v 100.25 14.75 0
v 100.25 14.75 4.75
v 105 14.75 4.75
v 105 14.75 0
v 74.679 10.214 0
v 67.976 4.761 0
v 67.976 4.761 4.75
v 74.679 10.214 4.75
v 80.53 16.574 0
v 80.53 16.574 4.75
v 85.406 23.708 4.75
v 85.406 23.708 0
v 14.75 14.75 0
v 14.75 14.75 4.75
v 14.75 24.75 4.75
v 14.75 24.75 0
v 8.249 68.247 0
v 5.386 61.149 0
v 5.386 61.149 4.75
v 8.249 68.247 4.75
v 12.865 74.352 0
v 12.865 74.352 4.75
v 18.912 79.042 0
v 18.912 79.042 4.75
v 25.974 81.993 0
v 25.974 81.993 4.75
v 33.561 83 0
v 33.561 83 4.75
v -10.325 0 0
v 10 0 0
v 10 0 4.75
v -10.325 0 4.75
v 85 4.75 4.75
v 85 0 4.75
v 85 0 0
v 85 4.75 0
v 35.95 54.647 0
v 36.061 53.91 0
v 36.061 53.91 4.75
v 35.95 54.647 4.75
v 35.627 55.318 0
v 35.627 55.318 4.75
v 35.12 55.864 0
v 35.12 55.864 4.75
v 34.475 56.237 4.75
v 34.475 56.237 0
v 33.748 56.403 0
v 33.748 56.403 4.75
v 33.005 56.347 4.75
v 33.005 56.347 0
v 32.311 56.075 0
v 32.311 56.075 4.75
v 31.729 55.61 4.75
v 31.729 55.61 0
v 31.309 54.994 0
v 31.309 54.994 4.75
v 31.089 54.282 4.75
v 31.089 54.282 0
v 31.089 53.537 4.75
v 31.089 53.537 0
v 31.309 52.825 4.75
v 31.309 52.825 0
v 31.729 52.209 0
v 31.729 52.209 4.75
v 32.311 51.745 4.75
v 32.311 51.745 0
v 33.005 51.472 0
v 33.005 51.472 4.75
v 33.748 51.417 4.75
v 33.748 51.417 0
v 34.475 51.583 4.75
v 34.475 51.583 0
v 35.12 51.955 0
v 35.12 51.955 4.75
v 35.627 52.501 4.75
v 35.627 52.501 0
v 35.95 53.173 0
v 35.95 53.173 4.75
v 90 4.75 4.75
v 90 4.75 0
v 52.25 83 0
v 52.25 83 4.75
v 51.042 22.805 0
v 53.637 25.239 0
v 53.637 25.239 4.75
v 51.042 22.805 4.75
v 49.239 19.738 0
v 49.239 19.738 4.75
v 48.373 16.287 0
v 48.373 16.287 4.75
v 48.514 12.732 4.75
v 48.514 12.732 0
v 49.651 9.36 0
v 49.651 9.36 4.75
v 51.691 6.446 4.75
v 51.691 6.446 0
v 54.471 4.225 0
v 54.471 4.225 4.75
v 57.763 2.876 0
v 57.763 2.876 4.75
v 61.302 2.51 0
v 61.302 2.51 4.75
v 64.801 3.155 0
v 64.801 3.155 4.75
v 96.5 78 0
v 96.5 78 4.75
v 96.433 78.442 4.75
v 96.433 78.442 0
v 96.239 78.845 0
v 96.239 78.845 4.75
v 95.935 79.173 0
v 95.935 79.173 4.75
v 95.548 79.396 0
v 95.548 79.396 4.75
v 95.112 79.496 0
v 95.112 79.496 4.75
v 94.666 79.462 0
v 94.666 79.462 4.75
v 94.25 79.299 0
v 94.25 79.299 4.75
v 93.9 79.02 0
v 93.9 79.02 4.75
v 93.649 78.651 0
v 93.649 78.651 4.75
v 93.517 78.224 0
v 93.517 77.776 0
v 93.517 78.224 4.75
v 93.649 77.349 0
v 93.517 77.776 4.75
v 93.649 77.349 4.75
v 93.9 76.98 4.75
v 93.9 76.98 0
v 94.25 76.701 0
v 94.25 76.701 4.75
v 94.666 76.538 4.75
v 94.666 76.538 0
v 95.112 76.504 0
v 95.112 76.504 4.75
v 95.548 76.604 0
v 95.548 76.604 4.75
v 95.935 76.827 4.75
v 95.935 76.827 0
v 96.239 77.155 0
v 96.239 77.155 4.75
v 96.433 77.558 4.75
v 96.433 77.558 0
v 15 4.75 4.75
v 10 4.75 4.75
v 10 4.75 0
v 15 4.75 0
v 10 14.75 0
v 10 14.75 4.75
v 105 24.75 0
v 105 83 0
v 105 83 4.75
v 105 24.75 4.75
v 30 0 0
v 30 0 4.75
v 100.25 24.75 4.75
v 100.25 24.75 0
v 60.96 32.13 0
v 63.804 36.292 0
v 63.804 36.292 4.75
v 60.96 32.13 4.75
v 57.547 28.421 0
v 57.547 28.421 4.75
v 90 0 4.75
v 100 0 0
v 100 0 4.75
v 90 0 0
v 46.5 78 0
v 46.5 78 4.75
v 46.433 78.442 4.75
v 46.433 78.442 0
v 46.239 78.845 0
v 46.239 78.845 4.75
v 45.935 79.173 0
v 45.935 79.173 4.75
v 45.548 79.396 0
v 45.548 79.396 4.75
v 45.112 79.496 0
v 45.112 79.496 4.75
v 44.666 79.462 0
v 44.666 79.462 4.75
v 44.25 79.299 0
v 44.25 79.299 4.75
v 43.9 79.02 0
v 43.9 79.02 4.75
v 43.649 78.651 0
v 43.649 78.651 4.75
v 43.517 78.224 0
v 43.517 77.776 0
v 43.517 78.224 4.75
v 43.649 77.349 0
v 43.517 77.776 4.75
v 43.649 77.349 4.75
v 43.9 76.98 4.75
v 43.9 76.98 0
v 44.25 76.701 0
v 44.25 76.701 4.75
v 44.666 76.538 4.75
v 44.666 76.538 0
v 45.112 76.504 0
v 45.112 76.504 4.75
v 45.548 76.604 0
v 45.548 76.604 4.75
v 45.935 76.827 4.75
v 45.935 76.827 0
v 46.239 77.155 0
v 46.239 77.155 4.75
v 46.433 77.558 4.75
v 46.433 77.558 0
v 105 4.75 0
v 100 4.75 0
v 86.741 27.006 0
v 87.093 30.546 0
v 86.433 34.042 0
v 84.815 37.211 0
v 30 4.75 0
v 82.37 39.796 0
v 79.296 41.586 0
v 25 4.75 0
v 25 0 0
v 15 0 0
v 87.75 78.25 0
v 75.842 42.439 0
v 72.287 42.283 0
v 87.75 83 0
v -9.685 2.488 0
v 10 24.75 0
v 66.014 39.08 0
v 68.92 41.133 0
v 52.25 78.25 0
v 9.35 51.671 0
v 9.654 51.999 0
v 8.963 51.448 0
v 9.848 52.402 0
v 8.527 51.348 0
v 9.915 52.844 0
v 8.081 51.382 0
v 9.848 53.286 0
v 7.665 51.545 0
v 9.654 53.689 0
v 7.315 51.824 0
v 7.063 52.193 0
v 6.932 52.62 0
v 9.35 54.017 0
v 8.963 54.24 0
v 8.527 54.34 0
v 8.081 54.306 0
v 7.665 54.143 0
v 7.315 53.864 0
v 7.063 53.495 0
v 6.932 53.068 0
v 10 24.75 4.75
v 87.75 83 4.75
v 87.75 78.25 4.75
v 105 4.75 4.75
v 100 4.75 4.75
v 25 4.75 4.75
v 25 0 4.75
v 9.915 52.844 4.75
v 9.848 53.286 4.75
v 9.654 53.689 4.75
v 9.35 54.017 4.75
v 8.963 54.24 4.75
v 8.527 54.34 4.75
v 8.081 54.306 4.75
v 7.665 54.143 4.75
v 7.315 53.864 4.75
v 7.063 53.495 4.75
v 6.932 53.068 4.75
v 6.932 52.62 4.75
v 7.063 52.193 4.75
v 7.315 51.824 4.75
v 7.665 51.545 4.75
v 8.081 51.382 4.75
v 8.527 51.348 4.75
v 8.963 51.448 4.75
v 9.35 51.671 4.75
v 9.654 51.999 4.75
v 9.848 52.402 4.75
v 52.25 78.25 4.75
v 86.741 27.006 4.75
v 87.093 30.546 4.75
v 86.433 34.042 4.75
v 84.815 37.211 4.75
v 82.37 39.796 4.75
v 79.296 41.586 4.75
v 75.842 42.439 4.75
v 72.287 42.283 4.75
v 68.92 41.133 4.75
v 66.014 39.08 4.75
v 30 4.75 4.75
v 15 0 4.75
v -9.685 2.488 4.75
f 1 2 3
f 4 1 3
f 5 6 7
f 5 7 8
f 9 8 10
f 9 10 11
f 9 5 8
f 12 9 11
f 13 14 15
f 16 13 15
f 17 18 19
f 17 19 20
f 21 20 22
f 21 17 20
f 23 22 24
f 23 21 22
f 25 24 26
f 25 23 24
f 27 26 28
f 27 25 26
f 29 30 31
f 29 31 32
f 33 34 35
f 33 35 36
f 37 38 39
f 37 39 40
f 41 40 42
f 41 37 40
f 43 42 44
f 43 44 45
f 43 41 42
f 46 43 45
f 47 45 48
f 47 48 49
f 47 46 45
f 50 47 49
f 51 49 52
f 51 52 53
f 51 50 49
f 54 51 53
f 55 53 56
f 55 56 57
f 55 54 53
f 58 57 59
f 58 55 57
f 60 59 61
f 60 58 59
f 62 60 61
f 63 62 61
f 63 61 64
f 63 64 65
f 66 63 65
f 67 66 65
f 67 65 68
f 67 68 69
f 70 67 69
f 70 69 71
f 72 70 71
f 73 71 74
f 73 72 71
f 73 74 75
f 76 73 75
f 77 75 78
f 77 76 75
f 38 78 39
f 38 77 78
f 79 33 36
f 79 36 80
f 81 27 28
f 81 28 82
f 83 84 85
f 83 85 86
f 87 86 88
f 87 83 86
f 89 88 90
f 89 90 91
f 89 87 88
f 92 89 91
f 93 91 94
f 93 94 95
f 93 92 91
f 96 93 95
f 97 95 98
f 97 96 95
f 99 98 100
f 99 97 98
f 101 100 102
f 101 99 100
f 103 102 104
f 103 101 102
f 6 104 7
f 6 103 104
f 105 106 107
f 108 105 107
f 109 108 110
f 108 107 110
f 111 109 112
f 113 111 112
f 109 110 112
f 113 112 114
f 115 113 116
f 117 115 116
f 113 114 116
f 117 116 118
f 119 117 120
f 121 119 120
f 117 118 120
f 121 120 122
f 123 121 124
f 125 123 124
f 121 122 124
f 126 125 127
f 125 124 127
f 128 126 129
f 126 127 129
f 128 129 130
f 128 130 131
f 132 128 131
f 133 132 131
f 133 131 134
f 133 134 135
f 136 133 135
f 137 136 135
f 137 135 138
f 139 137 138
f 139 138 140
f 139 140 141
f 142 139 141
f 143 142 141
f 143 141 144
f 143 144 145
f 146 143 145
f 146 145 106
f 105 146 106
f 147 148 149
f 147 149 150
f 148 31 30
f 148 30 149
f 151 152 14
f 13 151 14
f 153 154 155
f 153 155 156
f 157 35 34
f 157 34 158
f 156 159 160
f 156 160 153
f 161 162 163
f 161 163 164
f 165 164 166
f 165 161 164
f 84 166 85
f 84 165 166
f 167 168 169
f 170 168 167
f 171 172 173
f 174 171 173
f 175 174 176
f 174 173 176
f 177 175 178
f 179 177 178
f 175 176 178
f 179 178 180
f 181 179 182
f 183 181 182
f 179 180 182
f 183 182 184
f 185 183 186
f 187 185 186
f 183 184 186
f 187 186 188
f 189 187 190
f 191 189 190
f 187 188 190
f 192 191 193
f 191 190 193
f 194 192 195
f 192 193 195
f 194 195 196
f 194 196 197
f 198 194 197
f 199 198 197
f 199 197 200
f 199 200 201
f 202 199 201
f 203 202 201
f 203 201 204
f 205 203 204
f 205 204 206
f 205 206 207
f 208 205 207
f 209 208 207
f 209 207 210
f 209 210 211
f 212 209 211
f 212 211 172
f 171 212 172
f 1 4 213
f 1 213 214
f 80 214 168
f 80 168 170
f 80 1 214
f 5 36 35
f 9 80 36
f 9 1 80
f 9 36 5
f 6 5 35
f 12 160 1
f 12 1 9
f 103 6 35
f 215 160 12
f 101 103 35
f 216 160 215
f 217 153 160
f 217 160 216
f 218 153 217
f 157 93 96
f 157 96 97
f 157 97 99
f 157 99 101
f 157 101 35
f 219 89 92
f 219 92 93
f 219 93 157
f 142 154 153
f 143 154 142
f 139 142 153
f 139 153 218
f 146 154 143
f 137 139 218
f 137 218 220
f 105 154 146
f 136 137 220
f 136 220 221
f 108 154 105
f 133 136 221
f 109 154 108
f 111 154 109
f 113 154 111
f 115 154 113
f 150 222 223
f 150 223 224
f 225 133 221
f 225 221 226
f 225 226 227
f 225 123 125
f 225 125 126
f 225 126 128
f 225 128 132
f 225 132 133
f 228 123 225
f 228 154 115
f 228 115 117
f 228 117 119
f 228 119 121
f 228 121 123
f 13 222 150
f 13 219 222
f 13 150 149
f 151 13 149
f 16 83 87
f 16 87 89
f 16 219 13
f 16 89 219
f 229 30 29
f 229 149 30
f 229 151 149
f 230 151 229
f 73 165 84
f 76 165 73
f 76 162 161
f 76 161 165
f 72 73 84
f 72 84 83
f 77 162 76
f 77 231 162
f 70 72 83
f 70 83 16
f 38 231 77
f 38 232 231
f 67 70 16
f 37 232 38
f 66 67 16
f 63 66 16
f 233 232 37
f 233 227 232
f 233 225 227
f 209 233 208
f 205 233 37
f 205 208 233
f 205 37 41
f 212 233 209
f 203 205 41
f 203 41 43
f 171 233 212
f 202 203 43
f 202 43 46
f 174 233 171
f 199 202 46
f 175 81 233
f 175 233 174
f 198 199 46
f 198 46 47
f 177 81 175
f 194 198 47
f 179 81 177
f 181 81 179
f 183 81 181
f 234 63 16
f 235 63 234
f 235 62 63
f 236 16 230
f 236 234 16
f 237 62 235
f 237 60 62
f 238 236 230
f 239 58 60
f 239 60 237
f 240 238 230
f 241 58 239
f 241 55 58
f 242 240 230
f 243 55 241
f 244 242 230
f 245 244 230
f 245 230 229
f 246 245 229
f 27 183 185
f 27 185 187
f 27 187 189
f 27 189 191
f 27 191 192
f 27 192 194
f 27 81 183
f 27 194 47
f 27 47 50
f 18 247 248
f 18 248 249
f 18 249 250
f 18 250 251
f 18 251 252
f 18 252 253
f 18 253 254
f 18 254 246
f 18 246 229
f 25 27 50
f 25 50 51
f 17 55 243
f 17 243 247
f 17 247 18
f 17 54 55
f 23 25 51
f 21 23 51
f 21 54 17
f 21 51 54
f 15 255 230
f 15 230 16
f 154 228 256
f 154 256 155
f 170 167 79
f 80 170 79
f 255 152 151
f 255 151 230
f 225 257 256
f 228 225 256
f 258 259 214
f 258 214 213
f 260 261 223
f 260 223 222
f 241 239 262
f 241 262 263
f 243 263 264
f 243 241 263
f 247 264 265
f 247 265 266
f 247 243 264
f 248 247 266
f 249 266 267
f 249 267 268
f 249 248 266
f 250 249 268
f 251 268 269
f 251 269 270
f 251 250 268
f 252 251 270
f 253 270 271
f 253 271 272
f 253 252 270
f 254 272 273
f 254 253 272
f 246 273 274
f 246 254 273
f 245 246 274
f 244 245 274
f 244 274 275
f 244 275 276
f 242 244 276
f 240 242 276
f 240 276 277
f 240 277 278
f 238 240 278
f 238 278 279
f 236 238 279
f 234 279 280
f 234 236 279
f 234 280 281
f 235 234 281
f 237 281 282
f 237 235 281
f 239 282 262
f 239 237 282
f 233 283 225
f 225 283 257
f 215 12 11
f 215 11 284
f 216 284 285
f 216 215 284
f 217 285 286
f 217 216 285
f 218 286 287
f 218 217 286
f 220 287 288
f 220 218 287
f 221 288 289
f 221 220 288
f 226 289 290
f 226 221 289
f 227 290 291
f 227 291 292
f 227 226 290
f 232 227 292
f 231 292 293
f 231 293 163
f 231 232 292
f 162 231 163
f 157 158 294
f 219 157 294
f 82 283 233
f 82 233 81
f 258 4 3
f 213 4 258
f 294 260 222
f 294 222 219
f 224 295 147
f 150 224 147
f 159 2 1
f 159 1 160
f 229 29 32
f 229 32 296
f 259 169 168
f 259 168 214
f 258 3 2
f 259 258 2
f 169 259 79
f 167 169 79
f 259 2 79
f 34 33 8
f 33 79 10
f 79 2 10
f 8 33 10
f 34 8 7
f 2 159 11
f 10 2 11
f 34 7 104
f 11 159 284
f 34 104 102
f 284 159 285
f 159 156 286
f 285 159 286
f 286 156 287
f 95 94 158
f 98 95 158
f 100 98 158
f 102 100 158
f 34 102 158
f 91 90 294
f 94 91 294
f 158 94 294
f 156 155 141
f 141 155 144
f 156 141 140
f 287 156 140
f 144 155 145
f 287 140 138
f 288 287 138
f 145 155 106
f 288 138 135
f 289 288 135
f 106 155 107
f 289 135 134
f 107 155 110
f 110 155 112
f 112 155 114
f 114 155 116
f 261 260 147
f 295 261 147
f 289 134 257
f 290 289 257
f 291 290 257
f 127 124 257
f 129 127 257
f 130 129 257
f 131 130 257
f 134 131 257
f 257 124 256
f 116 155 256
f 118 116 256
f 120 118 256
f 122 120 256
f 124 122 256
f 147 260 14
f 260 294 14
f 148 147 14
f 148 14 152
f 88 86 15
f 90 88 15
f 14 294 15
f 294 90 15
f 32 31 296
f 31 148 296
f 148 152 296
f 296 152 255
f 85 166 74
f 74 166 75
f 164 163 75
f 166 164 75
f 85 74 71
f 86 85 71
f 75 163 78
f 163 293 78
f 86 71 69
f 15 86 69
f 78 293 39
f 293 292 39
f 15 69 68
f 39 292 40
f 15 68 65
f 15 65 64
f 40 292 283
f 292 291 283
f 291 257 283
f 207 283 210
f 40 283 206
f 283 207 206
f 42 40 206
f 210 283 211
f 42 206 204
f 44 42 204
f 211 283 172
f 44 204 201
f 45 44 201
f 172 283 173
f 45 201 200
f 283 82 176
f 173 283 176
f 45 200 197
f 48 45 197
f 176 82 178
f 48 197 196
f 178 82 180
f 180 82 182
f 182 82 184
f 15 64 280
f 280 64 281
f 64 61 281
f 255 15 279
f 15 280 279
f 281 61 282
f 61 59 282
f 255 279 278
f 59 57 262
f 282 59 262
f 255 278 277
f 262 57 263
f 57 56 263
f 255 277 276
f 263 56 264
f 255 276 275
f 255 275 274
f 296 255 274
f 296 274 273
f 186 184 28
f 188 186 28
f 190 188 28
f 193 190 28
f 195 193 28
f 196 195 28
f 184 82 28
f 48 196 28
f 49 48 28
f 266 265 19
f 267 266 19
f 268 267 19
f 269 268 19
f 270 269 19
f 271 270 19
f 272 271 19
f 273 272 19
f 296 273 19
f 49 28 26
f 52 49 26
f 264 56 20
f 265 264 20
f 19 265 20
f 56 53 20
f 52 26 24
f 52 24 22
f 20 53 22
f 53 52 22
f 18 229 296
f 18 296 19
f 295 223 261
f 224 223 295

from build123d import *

# Parameters (mm, degrees)
SKETCH1_R           = 2.5
BOSS_EXTRUDE1_DEPTH = 4.75
SKETCH2_W           = 5
SKETCH2_H           = 4.75
SKETCH2_W_2         = 4.75
SKETCH2_H_2         = 10
CUT_EXTRUDE1_DEPTH  = 134.927452376
SKETCH3_R           = 1.5
CUT_EXTRUDE2_DEPTH  = 134.927452376
SKETCH4_W           = 35.5
SKETCH4_H           = 4.75
CUT_EXTRUDE3_DEPTH  = 10
CAVITY1_OUTLINE_R   = 1.5
CAVITY1_DEPTH       = 4.75


# Read off the part's stored shape, not the designer's step: Cavity1
with BuildPart() as part:
    # Sketch1 → Boss-Extrude1 (new body)
    with BuildSketch(Plane.XY):
        with BuildLine():
            Line((-9.685424338, 2.488484559), (5.386220056, 61.148792841))
            ThreePointArc((5.386220056, 61.148792841), (15.733633721, 76.897010412), (33.561388608, 83))
            Line((33.561388608, 83), (105, 83))
            Line((105, 83), (105, 0))
            Line((105, 0), (-10.324792855, 0))
            Line((-10.324792855, 0), (-9.685424338, 2.488484559))
        make_face()
        with Locations((33.561388608, 53.909722104)):
            Circle(SKETCH1_R, mode=Mode.SUBTRACT)
        with BuildLine():
            ThreePointArc((67.975974789, 4.760599446), (77.719162031, 13.288409394), (85.405906554, 23.707967867))
            ThreePointArc((85.405906554, 23.707967867), (80.896997447, 40.800941239), (63.804024076, 36.292032133))
            ThreePointArc((63.804024076, 36.292032133), (59.320089771, 30.213956356), (53.63656388, 25.239400554))
            ThreePointArc((53.63656388, 25.239400554), (50.566868781, 7.830294546), (67.975974789, 4.760599446))
        make_face(mode=Mode.SUBTRACT)
    extrude(amount=BOSS_EXTRUDE1_DEPTH)

    # Sketch2 → Cut-Extrude1 (cut, through all)
    with BuildSketch(Plane.XY.offset(4.75)):
        with Locations((12.5, 2.375)):
            Rectangle(SKETCH2_W, SKETCH2_H)
        with Locations((102.5, 2.375)):
            Rectangle(SKETCH2_W, SKETCH2_H)
        with Locations((27.5, 2.375)):
            Rectangle(SKETCH2_W, SKETCH2_H)
        with Locations((87.5, 2.375)):
            Rectangle(SKETCH2_W, SKETCH2_H)
        with Locations((102.625, 19.75)):
            Rectangle(SKETCH2_W_2, SKETCH2_H_2)
        with Locations((12.375, 19.75)):
            Rectangle(SKETCH2_W_2, SKETCH2_H_2)
    extrude(amount=-CUT_EXTRUDE1_DEPTH, mode=Mode.SUBTRACT)

    # Sketch3 → Cut-Extrude2 (cut, through all)
    with BuildSketch(Plane.XY.offset(4.75)):
        with Locations((95, 78)):
            Circle(SKETCH3_R)
        with Locations((45, 78)):
            Circle(SKETCH3_R)
    extrude(amount=-CUT_EXTRUDE2_DEPTH, mode=Mode.SUBTRACT)

    # Sketch4 → Cut-Extrude3 (cut)
    with BuildSketch(Plane.XY.offset(4.75)):
        with Locations((70, 80.625)):
            Rectangle(SKETCH4_W, SKETCH4_H)
    extrude(amount=-CUT_EXTRUDE3_DEPTH, mode=Mode.SUBTRACT)

    # Cavity1 outline → Cavity1 (cut)
    with BuildSketch(Plane.XY):
        with Locations((8.414860226, 52.844005613)):
            Circle(CAVITY1_OUTLINE_R)
    extrude(amount=CAVITY1_DEPTH, mode=Mode.SUBTRACT)


solid = part.part
